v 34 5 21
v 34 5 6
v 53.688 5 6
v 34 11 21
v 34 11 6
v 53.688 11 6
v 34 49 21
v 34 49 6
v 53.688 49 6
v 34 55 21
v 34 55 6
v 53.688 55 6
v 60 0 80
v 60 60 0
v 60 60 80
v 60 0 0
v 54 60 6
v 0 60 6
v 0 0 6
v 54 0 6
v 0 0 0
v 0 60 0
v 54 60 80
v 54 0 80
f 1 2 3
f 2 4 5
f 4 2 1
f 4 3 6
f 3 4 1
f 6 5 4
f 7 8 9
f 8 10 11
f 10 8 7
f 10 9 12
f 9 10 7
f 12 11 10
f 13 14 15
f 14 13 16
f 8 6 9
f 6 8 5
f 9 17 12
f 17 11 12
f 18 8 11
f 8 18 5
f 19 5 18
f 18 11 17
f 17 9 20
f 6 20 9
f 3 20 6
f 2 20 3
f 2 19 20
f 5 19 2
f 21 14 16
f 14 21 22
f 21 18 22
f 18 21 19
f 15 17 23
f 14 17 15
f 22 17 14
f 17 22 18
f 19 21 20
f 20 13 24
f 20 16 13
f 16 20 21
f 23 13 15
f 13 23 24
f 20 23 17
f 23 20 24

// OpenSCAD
$fn = 32;

// ----------------------------------------------------------------------
// Rib bracket: 2-gusset L bracket
// ----------------------------------------------------------------------

// --- parameters (mm) ---
base_l = 60;              // foot length, X
base_w = 60;              // foot width, Y
base_t = 6;               // foot thickness
plate_t = 6;              // upright plate thickness
plate_h = 80;             // overall height
gus_l = 20;               // gusset leg along the foot
gus_h = 16;               // gusset height
gus_t = 6;                // gusset thickness
gus_edge = 5;             // gusset margin from the foot edge
n_gus = 2;                // gusset count
fit_tol = 0.1;            // tolerance for press fits, mm
free_tol = 0.5;           // tolerance for clearance fits, mm

gus_pitch = (base_w - 2 * gus_edge - gus_t) / (n_gus - 1);  // gusset pitch

union() {
  cube([base_l, base_w, base_t]);
  translate([base_l - plate_t, 0, base_t - 1])
    cube([plate_t, base_w, plate_h - base_t + 1]);
  for (i = [0 : n_gus - 1])
    translate([base_l - plate_t - gus_l, gus_edge + i * gus_pitch, base_t - 1])
      rotate([-90, 0, 0])
        linear_extrude(height = gus_t)
          polygon(points = [[0, 0], [gus_l + 1, 0], [0, -gus_h]]);
}
